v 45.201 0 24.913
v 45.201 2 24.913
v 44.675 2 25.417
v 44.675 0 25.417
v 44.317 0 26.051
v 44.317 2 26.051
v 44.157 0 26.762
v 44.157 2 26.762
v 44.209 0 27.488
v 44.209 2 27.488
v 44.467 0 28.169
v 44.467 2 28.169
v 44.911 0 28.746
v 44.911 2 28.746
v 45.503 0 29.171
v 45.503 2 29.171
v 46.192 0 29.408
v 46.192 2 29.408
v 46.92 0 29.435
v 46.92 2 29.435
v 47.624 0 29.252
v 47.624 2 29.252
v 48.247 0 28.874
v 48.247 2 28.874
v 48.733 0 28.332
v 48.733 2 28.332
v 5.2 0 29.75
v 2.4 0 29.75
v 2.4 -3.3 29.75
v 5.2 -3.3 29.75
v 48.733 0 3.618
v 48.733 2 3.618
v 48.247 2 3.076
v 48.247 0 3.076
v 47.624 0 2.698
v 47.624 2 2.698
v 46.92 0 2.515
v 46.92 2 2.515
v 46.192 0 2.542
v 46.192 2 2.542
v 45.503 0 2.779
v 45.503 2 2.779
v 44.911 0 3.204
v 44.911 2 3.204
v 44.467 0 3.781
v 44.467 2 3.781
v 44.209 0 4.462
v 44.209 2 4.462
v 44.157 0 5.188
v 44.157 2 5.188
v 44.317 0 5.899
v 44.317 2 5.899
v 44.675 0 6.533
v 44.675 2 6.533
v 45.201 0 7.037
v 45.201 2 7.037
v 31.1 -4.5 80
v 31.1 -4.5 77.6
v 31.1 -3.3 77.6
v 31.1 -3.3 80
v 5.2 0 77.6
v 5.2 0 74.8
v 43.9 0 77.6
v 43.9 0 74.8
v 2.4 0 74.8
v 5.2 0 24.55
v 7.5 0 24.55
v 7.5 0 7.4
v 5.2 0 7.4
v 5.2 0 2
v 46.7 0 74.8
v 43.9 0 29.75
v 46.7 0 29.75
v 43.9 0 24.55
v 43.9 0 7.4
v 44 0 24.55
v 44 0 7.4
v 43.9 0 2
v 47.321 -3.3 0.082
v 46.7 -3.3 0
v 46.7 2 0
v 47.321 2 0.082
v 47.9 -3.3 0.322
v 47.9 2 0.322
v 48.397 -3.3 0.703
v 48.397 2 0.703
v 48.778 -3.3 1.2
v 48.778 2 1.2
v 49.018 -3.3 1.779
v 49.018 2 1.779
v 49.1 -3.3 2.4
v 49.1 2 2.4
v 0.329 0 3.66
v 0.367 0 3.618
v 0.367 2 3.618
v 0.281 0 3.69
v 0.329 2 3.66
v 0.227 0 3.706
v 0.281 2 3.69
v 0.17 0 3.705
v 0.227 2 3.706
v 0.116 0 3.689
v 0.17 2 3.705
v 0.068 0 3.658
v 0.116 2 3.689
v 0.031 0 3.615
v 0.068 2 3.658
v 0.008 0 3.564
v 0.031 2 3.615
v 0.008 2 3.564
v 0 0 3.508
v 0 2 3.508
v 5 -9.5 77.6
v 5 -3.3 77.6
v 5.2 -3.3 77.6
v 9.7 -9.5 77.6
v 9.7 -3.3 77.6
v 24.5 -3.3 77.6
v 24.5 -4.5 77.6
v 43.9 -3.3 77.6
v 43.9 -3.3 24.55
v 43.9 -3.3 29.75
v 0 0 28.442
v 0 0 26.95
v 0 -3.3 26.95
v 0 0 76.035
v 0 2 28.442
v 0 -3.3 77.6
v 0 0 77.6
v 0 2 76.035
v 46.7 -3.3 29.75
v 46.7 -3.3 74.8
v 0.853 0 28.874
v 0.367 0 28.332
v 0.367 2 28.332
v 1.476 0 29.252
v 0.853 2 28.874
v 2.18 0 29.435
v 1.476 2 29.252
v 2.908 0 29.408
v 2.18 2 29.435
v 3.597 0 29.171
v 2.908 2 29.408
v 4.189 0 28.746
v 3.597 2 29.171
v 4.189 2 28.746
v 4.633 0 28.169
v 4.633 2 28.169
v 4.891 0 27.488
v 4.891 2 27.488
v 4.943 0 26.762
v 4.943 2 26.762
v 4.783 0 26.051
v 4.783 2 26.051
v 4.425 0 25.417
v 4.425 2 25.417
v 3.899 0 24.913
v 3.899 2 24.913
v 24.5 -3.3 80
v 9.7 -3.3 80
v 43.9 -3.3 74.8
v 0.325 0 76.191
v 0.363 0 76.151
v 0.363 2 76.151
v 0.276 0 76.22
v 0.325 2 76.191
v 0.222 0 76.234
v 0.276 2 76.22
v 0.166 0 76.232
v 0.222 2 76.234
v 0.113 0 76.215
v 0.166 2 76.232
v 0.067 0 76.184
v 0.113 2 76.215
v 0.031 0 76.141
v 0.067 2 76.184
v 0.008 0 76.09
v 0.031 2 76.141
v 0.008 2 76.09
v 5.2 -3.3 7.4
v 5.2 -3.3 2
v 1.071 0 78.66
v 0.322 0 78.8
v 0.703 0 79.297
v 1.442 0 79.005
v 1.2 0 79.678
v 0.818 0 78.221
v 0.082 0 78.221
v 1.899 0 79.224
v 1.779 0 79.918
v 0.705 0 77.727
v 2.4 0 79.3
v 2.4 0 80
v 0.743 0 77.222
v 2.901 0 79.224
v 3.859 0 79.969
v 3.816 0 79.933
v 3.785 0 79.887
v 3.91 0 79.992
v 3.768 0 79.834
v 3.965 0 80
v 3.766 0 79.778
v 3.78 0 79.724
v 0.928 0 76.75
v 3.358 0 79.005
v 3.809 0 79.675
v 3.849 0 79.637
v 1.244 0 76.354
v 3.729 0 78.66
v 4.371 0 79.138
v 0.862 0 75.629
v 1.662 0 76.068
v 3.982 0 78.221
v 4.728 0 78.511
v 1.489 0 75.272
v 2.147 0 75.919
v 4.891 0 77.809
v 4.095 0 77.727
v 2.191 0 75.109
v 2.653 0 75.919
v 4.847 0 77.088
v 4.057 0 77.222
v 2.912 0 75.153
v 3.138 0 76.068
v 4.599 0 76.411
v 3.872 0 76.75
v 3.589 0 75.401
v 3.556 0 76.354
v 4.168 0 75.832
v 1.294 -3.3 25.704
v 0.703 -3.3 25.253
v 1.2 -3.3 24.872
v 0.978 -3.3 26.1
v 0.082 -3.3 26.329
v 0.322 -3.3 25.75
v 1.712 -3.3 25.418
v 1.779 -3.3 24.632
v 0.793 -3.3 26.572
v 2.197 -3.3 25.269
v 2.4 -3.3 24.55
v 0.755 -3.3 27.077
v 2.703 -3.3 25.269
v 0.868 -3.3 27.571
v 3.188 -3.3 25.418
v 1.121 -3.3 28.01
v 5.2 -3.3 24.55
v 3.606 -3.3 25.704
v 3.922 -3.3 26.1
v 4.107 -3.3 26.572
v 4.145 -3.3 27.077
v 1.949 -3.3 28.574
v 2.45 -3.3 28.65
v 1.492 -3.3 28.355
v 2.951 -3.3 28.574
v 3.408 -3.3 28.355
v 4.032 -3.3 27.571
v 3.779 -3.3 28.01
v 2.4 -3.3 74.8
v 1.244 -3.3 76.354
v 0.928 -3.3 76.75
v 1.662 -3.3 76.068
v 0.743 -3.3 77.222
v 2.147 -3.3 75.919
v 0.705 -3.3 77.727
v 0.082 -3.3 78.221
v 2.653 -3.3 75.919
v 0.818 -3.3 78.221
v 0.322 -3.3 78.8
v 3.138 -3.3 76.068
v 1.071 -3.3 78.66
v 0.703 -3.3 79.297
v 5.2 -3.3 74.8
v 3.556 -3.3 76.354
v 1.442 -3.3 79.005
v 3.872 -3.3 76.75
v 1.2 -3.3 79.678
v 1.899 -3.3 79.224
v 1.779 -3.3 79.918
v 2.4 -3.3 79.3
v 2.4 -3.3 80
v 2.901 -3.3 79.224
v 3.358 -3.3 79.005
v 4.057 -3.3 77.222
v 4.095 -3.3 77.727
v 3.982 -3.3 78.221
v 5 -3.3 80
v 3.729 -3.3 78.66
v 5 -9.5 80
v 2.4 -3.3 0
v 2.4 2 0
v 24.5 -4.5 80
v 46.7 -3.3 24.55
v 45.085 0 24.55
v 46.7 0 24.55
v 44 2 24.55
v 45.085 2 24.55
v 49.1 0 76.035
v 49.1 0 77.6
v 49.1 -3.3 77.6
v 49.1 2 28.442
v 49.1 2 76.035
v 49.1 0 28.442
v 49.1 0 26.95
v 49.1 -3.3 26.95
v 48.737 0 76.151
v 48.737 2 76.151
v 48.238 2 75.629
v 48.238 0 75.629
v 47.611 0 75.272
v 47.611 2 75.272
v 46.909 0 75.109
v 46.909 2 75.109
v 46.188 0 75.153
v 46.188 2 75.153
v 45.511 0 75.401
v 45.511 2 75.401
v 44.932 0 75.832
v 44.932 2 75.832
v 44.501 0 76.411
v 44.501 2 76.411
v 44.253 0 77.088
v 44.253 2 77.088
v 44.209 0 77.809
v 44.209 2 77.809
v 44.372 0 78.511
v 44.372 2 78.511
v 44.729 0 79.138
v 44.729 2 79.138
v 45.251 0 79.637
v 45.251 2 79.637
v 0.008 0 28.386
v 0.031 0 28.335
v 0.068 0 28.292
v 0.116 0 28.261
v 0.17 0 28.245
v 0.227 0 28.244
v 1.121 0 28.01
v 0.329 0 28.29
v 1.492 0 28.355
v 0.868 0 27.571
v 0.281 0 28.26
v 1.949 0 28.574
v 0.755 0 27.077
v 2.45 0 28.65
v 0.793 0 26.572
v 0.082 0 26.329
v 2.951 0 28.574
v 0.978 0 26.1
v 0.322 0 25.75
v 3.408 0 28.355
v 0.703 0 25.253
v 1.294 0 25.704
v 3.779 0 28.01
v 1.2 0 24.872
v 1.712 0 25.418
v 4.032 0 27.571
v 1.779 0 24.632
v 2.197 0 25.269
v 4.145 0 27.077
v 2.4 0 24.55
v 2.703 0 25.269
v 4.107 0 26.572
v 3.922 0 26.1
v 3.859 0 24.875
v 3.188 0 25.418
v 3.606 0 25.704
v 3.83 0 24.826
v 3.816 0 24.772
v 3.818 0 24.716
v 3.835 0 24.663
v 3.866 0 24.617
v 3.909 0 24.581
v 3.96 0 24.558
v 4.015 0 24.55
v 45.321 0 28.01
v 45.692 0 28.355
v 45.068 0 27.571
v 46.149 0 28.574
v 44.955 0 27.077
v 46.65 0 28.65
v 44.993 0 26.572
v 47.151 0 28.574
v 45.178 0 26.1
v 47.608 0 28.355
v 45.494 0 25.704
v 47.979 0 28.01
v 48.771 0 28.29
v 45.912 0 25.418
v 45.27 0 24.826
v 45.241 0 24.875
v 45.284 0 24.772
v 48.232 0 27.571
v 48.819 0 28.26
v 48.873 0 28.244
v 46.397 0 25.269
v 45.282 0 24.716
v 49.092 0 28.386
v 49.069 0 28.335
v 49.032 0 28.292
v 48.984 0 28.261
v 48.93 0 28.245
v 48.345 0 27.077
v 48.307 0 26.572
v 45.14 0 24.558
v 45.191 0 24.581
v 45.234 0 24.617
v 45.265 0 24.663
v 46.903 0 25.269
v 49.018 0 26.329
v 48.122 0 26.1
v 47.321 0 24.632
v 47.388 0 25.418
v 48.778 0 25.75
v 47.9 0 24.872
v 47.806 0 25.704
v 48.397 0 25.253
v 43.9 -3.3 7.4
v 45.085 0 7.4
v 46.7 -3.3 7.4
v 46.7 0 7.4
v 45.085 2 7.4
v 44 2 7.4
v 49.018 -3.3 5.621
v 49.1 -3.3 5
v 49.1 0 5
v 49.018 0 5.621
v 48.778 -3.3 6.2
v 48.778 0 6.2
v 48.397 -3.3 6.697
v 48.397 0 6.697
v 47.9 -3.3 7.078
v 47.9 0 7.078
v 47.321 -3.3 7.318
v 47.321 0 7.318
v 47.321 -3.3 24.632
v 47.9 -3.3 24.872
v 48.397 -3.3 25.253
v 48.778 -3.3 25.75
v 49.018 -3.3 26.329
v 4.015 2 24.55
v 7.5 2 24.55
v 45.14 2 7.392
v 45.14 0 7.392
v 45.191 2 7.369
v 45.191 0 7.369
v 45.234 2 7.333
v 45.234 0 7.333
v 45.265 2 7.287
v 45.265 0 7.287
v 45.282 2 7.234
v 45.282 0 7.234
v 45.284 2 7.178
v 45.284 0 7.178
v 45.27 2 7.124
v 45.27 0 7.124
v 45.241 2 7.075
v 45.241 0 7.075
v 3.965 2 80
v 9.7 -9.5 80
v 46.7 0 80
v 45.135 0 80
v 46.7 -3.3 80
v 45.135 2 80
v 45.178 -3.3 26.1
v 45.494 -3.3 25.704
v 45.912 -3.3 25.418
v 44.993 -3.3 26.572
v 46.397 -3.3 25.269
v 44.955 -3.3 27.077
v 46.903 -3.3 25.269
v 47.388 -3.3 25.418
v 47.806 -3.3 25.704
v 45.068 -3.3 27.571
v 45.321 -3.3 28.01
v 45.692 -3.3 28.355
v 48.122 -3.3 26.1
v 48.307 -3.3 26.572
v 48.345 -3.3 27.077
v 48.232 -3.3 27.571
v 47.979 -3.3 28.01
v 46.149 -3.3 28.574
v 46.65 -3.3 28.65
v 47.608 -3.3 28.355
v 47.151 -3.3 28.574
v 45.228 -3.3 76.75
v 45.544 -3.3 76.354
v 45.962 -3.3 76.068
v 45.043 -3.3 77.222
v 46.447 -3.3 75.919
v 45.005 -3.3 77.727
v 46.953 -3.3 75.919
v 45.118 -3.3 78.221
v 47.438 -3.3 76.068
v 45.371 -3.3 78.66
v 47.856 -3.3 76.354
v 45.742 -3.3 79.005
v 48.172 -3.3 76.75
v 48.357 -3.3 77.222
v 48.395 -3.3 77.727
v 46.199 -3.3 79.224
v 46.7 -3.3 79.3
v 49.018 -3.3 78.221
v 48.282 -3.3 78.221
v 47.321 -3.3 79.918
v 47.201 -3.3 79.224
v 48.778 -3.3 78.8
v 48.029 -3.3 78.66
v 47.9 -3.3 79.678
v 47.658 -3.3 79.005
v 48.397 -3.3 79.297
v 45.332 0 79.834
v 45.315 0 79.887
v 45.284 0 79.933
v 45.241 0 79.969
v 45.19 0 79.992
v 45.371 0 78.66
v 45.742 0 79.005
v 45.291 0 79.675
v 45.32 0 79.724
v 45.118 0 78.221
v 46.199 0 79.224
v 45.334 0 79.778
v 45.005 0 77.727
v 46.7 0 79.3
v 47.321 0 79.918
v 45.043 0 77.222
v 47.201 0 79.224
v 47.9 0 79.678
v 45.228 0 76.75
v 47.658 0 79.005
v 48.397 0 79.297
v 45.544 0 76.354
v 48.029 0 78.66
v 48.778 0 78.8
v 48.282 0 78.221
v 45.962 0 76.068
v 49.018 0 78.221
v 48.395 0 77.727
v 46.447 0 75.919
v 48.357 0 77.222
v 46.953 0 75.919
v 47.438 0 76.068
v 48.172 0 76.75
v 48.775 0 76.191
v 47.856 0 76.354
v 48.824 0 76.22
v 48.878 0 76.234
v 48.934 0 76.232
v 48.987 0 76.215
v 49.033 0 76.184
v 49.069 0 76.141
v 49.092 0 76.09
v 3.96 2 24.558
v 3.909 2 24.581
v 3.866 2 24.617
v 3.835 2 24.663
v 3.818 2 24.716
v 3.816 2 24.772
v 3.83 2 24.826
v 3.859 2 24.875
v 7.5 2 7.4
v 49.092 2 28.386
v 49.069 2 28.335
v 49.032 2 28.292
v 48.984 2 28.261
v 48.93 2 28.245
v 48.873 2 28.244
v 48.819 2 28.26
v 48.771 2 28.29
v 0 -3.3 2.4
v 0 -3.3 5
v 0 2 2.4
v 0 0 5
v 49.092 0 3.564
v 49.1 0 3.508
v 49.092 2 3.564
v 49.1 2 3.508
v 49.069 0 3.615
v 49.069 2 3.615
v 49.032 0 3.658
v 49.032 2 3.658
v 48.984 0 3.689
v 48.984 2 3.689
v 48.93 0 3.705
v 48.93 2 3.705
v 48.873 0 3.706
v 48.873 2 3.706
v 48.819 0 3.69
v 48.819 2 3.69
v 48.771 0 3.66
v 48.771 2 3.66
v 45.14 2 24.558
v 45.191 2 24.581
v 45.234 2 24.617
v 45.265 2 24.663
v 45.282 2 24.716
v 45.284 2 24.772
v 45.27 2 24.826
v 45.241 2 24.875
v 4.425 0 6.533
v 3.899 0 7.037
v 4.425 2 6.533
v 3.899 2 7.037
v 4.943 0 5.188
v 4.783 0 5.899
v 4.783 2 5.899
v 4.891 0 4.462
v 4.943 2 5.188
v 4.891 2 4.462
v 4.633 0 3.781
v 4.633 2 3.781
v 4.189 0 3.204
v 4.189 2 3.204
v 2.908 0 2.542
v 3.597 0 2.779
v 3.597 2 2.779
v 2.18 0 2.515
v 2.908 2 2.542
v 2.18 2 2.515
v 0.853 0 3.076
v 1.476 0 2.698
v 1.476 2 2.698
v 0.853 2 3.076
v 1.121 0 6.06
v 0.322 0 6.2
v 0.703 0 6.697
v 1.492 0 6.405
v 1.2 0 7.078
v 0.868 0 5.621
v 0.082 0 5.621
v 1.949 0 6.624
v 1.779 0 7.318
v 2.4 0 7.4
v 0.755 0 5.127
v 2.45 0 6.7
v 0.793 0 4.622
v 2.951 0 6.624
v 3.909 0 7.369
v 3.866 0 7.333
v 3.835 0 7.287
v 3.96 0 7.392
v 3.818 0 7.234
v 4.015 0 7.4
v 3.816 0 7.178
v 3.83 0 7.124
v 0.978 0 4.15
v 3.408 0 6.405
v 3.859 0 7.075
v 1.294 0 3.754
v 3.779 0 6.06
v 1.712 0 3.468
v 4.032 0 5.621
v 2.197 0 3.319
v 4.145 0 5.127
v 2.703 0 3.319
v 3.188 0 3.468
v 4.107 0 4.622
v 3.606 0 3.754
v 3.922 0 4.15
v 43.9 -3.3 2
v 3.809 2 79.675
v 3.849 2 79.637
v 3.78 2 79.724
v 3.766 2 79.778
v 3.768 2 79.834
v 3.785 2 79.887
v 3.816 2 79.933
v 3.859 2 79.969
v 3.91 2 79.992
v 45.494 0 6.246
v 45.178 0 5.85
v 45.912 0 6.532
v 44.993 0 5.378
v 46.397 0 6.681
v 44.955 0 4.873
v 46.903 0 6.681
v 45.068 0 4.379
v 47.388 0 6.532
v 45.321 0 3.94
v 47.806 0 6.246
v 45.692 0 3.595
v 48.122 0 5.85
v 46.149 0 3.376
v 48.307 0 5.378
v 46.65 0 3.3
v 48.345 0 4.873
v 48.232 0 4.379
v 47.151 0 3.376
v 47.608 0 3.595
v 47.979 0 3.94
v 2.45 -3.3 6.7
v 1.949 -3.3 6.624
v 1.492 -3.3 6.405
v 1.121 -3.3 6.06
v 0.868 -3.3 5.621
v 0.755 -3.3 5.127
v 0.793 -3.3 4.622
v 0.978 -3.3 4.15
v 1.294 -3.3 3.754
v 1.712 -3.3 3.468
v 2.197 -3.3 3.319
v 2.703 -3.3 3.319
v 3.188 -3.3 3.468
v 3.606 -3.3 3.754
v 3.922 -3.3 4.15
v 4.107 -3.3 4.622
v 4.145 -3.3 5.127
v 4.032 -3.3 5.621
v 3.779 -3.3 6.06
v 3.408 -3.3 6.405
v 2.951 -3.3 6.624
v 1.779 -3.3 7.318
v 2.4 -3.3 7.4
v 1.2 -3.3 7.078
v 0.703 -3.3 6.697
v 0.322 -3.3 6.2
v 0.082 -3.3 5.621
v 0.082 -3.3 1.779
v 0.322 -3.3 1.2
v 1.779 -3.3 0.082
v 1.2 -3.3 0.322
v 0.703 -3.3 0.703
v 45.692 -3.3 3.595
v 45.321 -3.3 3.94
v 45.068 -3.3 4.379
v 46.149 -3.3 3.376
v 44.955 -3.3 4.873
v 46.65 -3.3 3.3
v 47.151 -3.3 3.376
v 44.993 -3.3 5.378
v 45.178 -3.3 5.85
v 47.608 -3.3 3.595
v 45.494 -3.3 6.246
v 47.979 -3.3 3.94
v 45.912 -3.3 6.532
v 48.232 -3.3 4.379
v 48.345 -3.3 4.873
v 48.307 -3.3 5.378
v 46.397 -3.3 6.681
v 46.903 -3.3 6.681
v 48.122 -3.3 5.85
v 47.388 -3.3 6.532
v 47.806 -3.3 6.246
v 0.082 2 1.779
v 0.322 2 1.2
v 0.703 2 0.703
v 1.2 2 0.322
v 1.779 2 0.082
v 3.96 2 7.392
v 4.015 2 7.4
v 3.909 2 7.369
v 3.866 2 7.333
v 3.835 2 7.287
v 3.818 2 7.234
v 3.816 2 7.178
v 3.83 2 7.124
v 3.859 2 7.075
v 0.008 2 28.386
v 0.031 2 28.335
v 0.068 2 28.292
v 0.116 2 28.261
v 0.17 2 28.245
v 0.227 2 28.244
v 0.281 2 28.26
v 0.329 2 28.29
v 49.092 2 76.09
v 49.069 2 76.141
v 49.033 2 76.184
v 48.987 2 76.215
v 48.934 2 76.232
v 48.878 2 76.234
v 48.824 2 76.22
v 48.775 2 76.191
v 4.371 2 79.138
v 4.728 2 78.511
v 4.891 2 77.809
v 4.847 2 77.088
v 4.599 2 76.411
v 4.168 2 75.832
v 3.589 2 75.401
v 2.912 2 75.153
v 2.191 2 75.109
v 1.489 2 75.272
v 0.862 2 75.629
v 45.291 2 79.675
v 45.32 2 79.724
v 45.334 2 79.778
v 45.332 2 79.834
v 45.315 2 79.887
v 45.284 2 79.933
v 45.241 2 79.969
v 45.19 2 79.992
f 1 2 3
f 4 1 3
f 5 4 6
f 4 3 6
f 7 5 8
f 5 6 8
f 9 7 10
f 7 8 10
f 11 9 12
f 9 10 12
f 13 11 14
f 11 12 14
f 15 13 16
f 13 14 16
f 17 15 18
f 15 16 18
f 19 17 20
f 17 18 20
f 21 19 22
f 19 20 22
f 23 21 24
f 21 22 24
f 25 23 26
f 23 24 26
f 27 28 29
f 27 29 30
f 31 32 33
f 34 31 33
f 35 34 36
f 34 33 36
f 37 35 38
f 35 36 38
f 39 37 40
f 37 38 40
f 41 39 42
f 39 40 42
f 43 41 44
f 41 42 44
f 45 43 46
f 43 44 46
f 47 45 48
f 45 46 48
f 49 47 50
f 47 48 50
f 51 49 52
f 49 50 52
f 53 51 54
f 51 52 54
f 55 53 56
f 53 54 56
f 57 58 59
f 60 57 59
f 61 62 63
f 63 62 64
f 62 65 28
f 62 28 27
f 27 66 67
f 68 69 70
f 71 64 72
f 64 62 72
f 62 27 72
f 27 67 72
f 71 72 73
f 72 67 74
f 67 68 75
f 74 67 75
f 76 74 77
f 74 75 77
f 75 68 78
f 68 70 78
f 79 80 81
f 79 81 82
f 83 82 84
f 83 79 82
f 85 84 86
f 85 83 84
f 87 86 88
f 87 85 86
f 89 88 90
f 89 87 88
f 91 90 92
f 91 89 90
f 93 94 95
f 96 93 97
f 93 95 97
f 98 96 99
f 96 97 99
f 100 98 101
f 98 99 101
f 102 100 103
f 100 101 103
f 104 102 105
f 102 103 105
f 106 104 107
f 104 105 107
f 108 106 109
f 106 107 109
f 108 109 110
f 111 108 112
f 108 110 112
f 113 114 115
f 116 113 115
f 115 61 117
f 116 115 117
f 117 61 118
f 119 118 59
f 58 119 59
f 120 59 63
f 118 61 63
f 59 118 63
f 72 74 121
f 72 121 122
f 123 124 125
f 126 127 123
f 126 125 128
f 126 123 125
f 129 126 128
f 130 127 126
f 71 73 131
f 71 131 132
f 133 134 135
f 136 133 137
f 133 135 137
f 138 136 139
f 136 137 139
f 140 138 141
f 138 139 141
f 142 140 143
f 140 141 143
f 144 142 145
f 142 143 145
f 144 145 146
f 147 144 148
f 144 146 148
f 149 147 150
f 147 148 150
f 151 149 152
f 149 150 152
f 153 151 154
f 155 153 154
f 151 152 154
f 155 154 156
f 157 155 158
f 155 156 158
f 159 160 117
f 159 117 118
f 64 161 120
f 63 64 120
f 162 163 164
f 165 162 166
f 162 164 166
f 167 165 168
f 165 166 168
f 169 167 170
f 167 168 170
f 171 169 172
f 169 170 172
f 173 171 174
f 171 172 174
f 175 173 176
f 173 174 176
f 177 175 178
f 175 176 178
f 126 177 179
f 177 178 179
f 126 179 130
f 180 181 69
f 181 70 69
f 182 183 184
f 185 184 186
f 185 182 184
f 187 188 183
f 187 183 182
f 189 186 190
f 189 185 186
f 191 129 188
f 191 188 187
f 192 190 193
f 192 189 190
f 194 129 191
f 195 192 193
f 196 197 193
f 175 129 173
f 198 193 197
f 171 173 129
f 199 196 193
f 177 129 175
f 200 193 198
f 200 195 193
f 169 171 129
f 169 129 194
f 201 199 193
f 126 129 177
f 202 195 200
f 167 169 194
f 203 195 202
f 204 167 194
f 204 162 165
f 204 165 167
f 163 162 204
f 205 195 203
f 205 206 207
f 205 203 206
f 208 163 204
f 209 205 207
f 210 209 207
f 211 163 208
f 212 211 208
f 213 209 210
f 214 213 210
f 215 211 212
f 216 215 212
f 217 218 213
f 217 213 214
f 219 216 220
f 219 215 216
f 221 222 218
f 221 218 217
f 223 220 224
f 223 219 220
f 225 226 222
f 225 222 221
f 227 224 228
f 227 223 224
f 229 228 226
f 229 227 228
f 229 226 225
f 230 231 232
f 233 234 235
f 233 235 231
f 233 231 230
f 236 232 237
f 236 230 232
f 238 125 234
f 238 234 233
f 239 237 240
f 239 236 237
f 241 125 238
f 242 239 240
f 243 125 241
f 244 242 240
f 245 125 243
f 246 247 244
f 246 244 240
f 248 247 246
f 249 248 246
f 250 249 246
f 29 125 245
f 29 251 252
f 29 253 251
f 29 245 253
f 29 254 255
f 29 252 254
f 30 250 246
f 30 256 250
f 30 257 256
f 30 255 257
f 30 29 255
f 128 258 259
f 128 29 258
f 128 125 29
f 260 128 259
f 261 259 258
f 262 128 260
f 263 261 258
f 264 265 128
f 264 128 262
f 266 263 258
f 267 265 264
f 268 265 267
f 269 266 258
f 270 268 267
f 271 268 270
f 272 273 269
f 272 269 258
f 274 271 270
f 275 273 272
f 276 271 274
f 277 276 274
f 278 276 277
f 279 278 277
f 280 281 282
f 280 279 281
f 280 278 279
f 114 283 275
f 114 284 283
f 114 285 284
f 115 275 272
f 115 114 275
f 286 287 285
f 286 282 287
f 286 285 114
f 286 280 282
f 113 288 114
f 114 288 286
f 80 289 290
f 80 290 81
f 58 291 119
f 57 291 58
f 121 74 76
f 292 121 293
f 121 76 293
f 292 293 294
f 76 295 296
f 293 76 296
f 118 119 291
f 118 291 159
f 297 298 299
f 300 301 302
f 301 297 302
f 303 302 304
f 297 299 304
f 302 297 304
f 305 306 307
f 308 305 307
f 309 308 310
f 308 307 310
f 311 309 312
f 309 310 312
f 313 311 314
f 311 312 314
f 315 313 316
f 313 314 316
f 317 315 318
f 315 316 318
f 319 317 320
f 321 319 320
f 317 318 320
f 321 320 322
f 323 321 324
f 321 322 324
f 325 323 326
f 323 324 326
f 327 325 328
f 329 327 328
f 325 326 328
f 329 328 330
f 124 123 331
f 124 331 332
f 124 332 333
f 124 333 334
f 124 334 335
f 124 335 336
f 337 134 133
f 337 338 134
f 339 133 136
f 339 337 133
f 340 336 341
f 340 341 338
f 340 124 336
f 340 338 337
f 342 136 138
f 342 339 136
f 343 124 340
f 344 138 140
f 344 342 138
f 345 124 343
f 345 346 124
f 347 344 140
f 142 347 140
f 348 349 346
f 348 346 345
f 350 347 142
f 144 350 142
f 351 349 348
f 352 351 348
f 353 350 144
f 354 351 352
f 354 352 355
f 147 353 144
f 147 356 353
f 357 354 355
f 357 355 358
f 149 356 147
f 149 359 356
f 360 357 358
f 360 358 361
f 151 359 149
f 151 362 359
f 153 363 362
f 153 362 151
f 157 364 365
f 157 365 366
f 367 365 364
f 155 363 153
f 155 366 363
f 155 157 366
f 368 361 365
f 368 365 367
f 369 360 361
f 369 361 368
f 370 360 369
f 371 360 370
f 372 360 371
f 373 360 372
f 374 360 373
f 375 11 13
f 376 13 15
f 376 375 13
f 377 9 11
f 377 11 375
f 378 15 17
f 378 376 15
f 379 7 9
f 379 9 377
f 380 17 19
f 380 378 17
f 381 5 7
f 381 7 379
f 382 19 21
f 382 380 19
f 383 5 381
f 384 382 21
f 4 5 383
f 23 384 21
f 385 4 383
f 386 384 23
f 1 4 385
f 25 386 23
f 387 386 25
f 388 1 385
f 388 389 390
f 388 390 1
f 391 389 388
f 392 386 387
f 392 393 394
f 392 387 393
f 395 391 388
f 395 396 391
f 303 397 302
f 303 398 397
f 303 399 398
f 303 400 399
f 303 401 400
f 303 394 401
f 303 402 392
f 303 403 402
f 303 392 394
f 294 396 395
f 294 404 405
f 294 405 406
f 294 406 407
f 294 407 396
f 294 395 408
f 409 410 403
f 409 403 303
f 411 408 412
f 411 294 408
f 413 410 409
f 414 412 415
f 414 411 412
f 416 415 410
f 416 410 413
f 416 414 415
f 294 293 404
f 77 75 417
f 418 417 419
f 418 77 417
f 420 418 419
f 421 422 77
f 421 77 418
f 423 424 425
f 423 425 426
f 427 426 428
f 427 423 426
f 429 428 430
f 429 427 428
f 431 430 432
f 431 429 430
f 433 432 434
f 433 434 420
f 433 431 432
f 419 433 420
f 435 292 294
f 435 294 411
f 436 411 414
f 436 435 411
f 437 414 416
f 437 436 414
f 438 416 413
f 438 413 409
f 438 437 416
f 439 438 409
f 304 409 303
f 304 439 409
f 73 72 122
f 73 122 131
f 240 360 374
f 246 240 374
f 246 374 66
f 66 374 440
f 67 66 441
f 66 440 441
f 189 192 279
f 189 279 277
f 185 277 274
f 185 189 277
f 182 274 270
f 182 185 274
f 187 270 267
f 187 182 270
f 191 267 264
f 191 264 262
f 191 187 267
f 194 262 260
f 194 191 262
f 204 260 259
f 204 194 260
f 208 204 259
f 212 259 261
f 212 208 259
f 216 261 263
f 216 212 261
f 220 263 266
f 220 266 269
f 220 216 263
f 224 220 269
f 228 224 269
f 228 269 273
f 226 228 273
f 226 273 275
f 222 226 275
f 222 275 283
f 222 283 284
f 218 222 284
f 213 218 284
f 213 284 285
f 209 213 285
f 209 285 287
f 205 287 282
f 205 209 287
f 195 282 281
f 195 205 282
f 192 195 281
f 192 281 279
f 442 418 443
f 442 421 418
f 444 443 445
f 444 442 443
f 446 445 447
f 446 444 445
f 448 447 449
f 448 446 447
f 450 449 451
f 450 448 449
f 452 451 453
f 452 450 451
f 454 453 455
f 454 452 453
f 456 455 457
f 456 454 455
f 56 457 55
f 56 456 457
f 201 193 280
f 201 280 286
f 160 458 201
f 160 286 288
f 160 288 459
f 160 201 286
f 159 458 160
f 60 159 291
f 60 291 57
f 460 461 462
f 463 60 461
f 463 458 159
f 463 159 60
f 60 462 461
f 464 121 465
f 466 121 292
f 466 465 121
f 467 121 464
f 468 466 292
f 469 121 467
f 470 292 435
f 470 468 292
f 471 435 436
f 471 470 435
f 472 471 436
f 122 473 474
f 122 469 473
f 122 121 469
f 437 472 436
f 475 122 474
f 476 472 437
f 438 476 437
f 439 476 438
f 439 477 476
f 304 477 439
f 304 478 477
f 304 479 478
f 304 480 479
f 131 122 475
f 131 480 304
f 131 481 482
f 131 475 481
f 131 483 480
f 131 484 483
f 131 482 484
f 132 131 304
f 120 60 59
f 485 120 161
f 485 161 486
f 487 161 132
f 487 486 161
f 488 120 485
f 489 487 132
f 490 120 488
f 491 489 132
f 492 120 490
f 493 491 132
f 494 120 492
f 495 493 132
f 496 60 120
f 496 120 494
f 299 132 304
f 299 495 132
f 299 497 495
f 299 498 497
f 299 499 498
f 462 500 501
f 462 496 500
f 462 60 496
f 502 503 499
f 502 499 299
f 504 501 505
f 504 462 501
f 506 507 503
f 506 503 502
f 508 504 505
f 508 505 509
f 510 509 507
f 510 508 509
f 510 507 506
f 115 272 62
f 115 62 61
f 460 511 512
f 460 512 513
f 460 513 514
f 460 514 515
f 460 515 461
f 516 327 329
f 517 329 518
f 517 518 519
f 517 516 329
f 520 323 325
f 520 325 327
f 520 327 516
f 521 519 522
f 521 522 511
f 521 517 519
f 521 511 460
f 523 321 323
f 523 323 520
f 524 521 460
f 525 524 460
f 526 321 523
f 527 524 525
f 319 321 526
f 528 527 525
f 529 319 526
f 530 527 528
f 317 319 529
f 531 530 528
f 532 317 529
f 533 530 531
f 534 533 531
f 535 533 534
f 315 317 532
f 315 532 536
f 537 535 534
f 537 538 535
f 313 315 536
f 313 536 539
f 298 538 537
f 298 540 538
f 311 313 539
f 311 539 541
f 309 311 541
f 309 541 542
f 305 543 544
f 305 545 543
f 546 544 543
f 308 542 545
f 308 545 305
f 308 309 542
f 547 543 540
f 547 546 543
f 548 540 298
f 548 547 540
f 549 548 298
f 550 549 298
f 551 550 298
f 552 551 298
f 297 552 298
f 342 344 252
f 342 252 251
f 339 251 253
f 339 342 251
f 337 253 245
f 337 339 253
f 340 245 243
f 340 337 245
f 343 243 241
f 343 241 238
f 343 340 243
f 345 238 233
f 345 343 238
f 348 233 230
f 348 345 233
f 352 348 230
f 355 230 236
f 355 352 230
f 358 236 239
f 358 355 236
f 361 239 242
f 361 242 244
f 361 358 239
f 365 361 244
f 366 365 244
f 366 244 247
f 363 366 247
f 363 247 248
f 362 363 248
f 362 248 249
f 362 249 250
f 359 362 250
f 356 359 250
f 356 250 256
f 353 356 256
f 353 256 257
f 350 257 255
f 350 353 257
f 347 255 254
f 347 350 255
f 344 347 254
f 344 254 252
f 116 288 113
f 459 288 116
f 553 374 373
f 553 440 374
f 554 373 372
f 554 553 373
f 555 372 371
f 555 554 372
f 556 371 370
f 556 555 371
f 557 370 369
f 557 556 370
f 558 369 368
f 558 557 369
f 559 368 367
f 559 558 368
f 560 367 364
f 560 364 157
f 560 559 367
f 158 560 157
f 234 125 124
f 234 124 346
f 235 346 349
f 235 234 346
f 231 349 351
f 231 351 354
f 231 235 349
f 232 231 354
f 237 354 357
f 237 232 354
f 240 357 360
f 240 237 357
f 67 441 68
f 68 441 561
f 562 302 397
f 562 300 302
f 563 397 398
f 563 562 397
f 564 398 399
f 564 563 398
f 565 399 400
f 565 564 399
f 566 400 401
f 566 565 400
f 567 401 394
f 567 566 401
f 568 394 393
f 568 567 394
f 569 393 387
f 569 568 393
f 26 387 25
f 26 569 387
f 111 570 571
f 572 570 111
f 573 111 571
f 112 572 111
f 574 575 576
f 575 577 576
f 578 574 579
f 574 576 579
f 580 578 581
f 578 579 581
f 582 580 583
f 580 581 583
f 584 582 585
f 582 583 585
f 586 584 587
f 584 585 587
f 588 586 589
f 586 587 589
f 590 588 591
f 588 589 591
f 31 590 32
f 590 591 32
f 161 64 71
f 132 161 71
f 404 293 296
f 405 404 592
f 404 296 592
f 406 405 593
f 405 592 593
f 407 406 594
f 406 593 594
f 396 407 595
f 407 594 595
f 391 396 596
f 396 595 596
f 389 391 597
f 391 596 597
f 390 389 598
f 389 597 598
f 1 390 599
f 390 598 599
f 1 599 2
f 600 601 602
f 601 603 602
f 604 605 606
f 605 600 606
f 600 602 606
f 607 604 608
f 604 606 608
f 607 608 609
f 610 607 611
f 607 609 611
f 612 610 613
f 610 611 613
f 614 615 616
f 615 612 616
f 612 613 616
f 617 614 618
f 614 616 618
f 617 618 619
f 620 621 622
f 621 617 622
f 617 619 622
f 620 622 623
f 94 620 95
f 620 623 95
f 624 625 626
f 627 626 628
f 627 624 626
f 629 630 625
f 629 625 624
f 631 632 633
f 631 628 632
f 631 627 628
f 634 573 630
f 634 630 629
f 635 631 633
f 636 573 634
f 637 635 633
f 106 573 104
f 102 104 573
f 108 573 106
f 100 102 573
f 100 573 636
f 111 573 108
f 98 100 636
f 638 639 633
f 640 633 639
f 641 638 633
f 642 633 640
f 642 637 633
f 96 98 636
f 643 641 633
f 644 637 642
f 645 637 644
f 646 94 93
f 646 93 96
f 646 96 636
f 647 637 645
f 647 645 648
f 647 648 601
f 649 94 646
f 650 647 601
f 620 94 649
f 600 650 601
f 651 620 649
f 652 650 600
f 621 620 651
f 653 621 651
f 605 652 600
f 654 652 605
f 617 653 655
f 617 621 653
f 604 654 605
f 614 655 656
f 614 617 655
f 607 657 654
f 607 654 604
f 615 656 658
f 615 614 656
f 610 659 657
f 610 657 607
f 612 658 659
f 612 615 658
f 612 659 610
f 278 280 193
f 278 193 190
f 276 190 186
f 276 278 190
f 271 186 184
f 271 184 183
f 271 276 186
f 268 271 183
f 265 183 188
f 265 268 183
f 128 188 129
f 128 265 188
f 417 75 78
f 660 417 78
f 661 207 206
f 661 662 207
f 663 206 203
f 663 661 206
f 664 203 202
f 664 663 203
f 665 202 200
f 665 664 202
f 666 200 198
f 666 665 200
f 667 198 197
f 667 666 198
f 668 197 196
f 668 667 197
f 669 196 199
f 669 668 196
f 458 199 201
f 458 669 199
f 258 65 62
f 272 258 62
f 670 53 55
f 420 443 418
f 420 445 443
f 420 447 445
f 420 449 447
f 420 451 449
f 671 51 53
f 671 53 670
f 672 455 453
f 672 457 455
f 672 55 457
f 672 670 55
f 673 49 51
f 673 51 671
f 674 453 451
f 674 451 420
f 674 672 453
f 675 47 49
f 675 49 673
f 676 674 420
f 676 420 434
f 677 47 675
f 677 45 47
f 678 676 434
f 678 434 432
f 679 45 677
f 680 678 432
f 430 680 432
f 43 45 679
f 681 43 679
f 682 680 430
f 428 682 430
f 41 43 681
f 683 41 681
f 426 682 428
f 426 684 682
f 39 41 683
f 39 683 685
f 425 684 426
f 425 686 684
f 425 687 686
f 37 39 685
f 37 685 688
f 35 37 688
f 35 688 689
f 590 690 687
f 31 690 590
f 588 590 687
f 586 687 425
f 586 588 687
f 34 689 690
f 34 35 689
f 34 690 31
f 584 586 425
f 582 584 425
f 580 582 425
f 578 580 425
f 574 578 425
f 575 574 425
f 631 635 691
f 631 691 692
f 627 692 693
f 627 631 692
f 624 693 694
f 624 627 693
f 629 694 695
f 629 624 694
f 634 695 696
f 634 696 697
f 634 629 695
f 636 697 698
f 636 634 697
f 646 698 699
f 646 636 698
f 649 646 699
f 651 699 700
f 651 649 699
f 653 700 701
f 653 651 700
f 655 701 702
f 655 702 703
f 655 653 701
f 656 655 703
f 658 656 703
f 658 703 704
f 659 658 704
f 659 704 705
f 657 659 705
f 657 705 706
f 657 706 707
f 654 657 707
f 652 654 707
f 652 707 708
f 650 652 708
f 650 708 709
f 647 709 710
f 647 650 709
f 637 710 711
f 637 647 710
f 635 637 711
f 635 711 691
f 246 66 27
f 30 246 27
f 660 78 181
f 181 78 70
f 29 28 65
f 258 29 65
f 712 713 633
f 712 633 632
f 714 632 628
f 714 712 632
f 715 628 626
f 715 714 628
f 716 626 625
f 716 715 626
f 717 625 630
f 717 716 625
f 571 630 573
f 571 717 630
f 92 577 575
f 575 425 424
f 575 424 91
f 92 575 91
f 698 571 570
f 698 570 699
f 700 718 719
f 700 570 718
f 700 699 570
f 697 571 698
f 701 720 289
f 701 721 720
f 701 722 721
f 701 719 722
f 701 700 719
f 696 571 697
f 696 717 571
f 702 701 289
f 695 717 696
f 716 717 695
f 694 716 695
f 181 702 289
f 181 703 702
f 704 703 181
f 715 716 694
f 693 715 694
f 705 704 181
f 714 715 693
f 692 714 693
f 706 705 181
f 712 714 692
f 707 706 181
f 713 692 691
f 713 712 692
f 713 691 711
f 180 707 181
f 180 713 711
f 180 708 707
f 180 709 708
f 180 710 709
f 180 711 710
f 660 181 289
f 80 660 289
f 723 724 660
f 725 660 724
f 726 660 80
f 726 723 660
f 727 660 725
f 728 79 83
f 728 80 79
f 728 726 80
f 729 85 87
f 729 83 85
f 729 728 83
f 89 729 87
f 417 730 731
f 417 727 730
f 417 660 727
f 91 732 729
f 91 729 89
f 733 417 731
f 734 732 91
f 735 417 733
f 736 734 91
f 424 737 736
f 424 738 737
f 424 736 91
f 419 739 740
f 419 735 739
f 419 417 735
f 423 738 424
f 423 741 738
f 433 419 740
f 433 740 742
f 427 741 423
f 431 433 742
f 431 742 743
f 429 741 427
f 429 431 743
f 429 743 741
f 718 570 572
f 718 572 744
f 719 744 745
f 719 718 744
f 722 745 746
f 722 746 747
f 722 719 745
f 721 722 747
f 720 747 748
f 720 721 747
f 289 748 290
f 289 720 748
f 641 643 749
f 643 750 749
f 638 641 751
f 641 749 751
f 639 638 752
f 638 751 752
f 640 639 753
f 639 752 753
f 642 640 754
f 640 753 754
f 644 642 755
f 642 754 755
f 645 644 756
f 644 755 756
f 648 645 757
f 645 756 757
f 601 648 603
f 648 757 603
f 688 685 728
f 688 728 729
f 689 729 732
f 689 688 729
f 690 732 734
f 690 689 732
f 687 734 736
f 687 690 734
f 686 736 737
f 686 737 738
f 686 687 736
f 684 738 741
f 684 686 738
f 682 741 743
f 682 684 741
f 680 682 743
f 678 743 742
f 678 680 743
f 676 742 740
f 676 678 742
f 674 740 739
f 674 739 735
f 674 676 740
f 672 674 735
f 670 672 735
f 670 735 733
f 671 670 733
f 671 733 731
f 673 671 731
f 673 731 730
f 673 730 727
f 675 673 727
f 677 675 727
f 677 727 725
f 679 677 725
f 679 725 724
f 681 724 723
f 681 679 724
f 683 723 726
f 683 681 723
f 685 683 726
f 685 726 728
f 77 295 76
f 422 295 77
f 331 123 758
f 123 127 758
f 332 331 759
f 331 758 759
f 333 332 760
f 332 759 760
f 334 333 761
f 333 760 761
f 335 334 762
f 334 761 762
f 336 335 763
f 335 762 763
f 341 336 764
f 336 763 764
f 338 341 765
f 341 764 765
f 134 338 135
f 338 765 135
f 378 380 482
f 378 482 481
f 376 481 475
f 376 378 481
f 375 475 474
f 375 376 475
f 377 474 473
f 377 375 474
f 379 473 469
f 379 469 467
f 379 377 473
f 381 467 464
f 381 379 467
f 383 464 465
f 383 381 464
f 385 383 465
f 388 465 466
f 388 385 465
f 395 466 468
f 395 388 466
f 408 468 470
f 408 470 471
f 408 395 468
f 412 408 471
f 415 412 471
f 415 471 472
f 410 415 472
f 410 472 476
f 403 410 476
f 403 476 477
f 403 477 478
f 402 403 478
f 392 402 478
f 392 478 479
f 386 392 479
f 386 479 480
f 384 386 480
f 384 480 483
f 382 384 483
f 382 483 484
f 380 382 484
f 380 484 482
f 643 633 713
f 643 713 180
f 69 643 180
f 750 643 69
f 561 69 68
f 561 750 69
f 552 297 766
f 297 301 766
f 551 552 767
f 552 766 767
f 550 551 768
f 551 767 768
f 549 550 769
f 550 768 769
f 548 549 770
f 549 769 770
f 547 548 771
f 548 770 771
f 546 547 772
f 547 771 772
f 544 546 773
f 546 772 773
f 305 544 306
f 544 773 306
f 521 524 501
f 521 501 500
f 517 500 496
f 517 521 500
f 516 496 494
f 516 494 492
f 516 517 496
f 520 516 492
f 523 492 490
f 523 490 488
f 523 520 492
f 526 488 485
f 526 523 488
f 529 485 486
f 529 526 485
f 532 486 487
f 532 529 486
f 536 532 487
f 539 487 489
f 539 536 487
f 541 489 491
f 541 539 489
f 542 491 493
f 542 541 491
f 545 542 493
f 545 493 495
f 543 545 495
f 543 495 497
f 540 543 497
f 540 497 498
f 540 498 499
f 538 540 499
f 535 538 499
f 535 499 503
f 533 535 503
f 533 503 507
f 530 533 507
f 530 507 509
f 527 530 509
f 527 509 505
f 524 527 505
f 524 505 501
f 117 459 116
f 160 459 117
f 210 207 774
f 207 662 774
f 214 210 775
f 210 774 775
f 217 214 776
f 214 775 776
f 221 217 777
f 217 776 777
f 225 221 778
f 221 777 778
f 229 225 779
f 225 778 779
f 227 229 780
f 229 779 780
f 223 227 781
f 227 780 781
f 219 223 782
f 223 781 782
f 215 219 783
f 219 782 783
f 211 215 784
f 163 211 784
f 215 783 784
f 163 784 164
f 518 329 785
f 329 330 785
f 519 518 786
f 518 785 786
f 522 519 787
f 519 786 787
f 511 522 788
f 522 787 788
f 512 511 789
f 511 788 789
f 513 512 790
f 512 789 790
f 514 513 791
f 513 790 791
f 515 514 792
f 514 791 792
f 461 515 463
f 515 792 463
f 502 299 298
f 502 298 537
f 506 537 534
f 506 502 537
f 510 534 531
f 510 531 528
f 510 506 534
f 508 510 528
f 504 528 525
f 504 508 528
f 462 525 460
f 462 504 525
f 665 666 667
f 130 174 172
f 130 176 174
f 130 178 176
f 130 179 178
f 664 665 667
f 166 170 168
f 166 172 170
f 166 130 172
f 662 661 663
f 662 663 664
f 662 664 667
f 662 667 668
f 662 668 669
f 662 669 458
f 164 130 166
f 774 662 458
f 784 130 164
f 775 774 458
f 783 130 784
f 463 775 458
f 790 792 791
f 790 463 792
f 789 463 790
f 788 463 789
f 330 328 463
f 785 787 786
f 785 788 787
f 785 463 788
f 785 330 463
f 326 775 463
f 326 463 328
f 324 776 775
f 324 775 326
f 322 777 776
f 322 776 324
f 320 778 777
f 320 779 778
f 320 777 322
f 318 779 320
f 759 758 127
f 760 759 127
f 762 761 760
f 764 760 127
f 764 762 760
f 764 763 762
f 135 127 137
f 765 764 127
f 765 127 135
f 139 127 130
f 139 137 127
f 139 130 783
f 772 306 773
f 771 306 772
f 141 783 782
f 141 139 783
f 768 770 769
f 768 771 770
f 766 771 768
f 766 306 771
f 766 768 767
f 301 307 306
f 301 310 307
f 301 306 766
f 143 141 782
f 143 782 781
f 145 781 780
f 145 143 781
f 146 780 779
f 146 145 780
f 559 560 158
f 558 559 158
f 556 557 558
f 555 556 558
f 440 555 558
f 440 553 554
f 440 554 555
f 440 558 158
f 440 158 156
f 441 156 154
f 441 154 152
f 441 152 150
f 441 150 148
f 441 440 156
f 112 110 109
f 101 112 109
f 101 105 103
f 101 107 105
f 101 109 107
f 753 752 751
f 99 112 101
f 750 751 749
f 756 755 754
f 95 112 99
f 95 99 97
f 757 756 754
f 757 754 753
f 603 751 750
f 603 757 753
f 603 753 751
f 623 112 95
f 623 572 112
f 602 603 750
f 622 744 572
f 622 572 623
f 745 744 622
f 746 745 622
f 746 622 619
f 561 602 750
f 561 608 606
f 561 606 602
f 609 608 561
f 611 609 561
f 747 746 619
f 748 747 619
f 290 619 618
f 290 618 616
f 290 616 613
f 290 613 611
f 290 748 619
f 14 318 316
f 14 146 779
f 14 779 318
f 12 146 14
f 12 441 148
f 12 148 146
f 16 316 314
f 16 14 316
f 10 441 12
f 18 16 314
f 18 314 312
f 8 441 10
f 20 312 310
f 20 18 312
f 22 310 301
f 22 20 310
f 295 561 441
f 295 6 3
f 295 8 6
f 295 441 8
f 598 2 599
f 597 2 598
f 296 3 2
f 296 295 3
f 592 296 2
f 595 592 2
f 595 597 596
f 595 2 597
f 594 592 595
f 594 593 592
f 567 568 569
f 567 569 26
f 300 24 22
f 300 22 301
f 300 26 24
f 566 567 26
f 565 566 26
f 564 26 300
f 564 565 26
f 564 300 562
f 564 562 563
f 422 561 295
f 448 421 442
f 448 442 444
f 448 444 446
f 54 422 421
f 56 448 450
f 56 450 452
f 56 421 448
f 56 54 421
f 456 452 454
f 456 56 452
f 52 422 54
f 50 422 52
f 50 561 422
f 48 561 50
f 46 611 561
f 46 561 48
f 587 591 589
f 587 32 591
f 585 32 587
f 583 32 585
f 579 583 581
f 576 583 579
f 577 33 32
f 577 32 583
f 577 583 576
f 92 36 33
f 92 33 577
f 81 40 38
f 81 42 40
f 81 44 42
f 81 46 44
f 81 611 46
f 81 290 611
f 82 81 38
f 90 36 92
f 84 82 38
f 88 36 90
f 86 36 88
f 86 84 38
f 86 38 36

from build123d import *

# Parameters (mm, degrees)
SKETCH1_W           = 49.1
SKETCH1_H           = 80
BOSS_EXTRUDE1_DEPTH = 2
SKETCH2_R           = 1.7
CUT_EXTRUDE1_DEPTH  = 2
SKETCH3_W           = 5.2
SKETCH3_H           = 5.2
SKETCH3_R           = 1.7
BOSS_EXTRUDE2_DEPTH = 3.3
SKETCH4_W           = 7.5
SKETCH4_H           = 17.15
SKETCH4_W_2         = 5.1
CUT_EXTRUDE2_DEPTH  = 3.3
SKETCH7_W           = 38.7
SKETCH7_H           = 2.4
SKETCH7_W_2         = 2.4
SKETCH7_H_2         = 45.05
BOSS_EXTRUDE4_DEPTH = 3.3
SKETCH8_W           = 6.6
SKETCH8_H           = 1.2
SKETCH8_W_2         = 4.7
SKETCH8_H_2         = 6.2
BOSS_EXTRUDE5_DEPTH = 2.4
FILLET1_START       = -9.5
FILLET1_DEPTH       = 12.5
SKETCH9_R           = 2.5
CUT_EXTRUDE3_DEPTH  = 2
FILLET2_R           = 0.2


with BuildPart() as part:
    # Sketch1 → Boss-Extrude1 (new body)
    with BuildSketch(Plane(origin=(0, 0, 0), x_dir=(1, 0, 0), z_dir=(0, 1, 0))):
        with Locations((24.55, -40)):
            Rectangle(SKETCH1_W, SKETCH1_H)
    extrude(amount=BOSS_EXTRUDE1_DEPTH)

    # Sketch2 → Cut-Extrude1 (cut)
    with BuildSketch(Plane(origin=(0, 2, 0), x_dir=(1, 0, 0), z_dir=(0, 1, 0))):
        with Locations(Location((2.4, -77.6, 0), (0, 0, 270))):
            Circle(SKETCH2_R)
        with Locations(Location((2.45, -26.95, 0), (0, 0, 270))):
            Circle(SKETCH2_R)
        with Locations(Location((2.45, -5, 0), (0, 0, 270))):
            Circle(SKETCH2_R)
        with Locations(Location((46.7, -77.6, 0), (0, 0, 90))):
            Circle(SKETCH2_R)
        with Locations(Location((46.65, -26.95, 0), (0, 0, 90))):
            Circle(SKETCH2_R)
        with Locations(Location((46.65, -5, 0), (0, 0, 90))):
            Circle(SKETCH2_R)
    extrude(amount=-CUT_EXTRUDE1_DEPTH, mode=Mode.SUBTRACT)

    # Sketch3 → Boss-Extrude2 (add)
    # profile 1 of 6: a face of its own
    with BuildSketch(Plane.XZ):
        with Locations((2.6, 77.4)):
            Rectangle(SKETCH3_W, SKETCH3_H)
        with Locations(Location((2.4, 77.6, 0), (0, 0, 90))):
            Circle(SKETCH3_R, mode=Mode.SUBTRACT)
    # profile 2 of 6: a face of its own
    with BuildSketch(Plane.XZ):
        with Locations((2.6, 27.15)):
            Rectangle(SKETCH3_W, SKETCH3_H)
        with Locations(Location((2.45, 26.95, 0), (0, 0, 90))):
            Circle(SKETCH3_R, mode=Mode.SUBTRACT)
    # profile 3 of 6: a face of its own
    with BuildSketch(Plane.XZ):
        with Locations((2.6, 4.8)):
            Rectangle(SKETCH3_W, SKETCH3_H)
        with Locations(Location((2.45, 5, 0), (0, 0, 90))):
            Circle(SKETCH3_R, mode=Mode.SUBTRACT)
    # profile 4 of 6: a face of its own
    with BuildSketch(Plane.XZ):
        with Locations((46.5, 4.8)):
            Rectangle(SKETCH3_W, SKETCH3_H)
        with Locations(Location((46.65, 5, 0), (0, 0, 270))):
            Circle(SKETCH3_R, mode=Mode.SUBTRACT)
    # profile 5 of 6: a face of its own
    with BuildSketch(Plane.XZ):
        with Locations((46.5, 27.15)):
            Rectangle(SKETCH3_W, SKETCH3_H)
        with Locations(Location((46.65, 26.95, 0), (0, 0, 90))):
            Circle(SKETCH3_R, mode=Mode.SUBTRACT)
    # profile 6 of 6: a face of its own
    with BuildSketch(Plane.XZ):
        with Locations((46.5, 77.4)):
            Rectangle(SKETCH3_W, SKETCH3_H)
        with Locations(Location((46.7, 77.6, 0), (0, 0, 90))):
            Circle(SKETCH3_R, mode=Mode.SUBTRACT)
    extrude(amount=BOSS_EXTRUDE2_DEPTH)

    # Sketch4 → Cut-Extrude2 (cut)
    with BuildSketch(Plane(origin=(0, 2, 0), x_dir=(1, 0, 0), z_dir=(0, 1, 0))):
        with Locations((3.75, -15.975)):
            Rectangle(SKETCH4_W, SKETCH4_H)
        with Locations((46.55, -15.975)):
            Rectangle(SKETCH4_W_2, SKETCH4_H)
    extrude(amount=-CUT_EXTRUDE2_DEPTH, mode=Mode.SUBTRACT)

    # Sketch7 → Boss-Extrude4 (add)
    with BuildSketch(Plane.XZ):
        with Locations((24.55, 78.8)):
            Rectangle(SKETCH7_W, SKETCH7_H)
        with Locations((47.9, 52.275)):
            Rectangle(SKETCH7_W_2, SKETCH7_H_2)
        with Locations((1.2, 52.275)):
            Rectangle(SKETCH7_W_2, SKETCH7_H_2)
        Polygon((0, 0), (49.1, 0), (49.1, 2), (49.1, 2.2), (43.9, 2.2), (43.9, 2), (5.2, 2), (5.2, 2.2), (0, 2.2), (0, 2), align=None)
    extrude(amount=BOSS_EXTRUDE4_DEPTH)

    # Sketch8 → Boss-Extrude5 (add)
    with BuildSketch(Plane.XY.offset(80)):
        with Locations((27.8, -3.9)):
            Rectangle(SKETCH8_W, SKETCH8_H)
        with Locations((7.35, -6.4)):
            Rectangle(SKETCH8_W_2, SKETCH8_H_2)
    extrude(amount=-BOSS_EXTRUDE5_DEPTH)

    # Fillet1: read off the stored shape, not the designer's step
    # Fillet1 outline → Fillet1 (cut)
    with BuildSketch(Plane(origin=(0, 0, 0), x_dir=(1, 0, 0), z_dir=(0, 1, 0)).offset(FILLET1_START)):
        with BuildLine():
            Line((0, 0), (0, -2.4))
            ThreePointArc((0, -2.4), (0.702943725, -0.702943725), (2.4, 0))
            Line((2.4, 0), (0, 0))
        make_face()
        with BuildLine():
            ThreePointArc((2.4, -7.4), (0.702943725, -6.697056275), (0, -5))
            Line((0, -5), (0, -7.4))
            Line((0, -7.4), (2.4, -7.4))
        make_face()
        with BuildLine():
            Line((49.1, -7.4), (49.1, -5))
            ThreePointArc((49.1, -5), (48.397056275, -6.697056275), (46.7, -7.4))
            Line((46.7, -7.4), (49.1, -7.4))
        make_face()
        with BuildLine():
            Line((49.1, 0), (46.7, 0))
            ThreePointArc((46.7, 0), (48.397056275, -0.702943725), (49.1, -2.4))
            Line((49.1, -2.4), (49.1, 0))
        make_face()
        with BuildLine():
            Line((0, -80), (2.4, -80))
            ThreePointArc((2.4, -80), (0.702943725, -79.297056275), (0, -77.6))
            Line((0, -77.6), (0, -80))
        make_face()
        with BuildLine():
            ThreePointArc((46.7, -24.55), (48.397056275, -25.252943725), (49.1, -26.95))
            Line((49.1, -26.95), (49.1, -24.55))
            Line((49.1, -24.55), (46.7, -24.55))
        make_face()
        with BuildLine():
            ThreePointArc((49.1, -77.6), (48.397056275, -79.297056275), (46.7, -80))
            Line((46.7, -80), (49.1, -80))
            Line((49.1, -80), (49.1, -77.6))
        make_face()
        with BuildLine():
            Line((0, -24.55), (0, -26.95))
            ThreePointArc((0, -26.95), (0.702943725, -25.252943725), (2.4, -24.55))
            Line((2.4, -24.55), (0, -24.55))
        make_face()
    extrude(amount=FILLET1_DEPTH, mode=Mode.SUBTRACT)

    # Sketch9 → Cut-Extrude3 (cut)
    with BuildSketch(Plane(origin=(0, 2, 0), x_dir=(1, 0, 0), z_dir=(0, 1, 0))):
        with Locations((2.45, -5)):
            Circle(SKETCH9_R)
        with Locations((2.45, -26.95)):
            Circle(SKETCH9_R)
        with Locations((2.4, -77.6)):
            Circle(SKETCH9_R)
        with Locations((46.7, -77.6)):
            Circle(SKETCH9_R)
        with Locations((46.65, -26.95)):
            Circle(SKETCH9_R)
        with Locations((46.65, -5)):
            Circle(SKETCH9_R)
    extrude(amount=-CUT_EXTRUDE3_DEPTH, mode=Mode.SUBTRACT)

    # Fillet2
    fillet2_edges = [part.edges().sort_by_distance(p)[0] for p in [
        (45.95, 1, 24.55),
        (45.95, 1, 7.4),
        (3.15, 1, 7.4),
        (3.15, 1, 24.55),
        (49.1, 1, 4.502506281),
        (49.1, 1, 27.447493719),
        (49.1, 1, 76.9),
        (46, 1, 80),
        (0, 1, 76.9),
        (3.1, 1, 80),
        (0, 1, 27.447493719),
        (0, 1, 4.502506281),
    ]]
    fillet(fillet2_edges, radius=FILLET2_R)


solid = part.part
